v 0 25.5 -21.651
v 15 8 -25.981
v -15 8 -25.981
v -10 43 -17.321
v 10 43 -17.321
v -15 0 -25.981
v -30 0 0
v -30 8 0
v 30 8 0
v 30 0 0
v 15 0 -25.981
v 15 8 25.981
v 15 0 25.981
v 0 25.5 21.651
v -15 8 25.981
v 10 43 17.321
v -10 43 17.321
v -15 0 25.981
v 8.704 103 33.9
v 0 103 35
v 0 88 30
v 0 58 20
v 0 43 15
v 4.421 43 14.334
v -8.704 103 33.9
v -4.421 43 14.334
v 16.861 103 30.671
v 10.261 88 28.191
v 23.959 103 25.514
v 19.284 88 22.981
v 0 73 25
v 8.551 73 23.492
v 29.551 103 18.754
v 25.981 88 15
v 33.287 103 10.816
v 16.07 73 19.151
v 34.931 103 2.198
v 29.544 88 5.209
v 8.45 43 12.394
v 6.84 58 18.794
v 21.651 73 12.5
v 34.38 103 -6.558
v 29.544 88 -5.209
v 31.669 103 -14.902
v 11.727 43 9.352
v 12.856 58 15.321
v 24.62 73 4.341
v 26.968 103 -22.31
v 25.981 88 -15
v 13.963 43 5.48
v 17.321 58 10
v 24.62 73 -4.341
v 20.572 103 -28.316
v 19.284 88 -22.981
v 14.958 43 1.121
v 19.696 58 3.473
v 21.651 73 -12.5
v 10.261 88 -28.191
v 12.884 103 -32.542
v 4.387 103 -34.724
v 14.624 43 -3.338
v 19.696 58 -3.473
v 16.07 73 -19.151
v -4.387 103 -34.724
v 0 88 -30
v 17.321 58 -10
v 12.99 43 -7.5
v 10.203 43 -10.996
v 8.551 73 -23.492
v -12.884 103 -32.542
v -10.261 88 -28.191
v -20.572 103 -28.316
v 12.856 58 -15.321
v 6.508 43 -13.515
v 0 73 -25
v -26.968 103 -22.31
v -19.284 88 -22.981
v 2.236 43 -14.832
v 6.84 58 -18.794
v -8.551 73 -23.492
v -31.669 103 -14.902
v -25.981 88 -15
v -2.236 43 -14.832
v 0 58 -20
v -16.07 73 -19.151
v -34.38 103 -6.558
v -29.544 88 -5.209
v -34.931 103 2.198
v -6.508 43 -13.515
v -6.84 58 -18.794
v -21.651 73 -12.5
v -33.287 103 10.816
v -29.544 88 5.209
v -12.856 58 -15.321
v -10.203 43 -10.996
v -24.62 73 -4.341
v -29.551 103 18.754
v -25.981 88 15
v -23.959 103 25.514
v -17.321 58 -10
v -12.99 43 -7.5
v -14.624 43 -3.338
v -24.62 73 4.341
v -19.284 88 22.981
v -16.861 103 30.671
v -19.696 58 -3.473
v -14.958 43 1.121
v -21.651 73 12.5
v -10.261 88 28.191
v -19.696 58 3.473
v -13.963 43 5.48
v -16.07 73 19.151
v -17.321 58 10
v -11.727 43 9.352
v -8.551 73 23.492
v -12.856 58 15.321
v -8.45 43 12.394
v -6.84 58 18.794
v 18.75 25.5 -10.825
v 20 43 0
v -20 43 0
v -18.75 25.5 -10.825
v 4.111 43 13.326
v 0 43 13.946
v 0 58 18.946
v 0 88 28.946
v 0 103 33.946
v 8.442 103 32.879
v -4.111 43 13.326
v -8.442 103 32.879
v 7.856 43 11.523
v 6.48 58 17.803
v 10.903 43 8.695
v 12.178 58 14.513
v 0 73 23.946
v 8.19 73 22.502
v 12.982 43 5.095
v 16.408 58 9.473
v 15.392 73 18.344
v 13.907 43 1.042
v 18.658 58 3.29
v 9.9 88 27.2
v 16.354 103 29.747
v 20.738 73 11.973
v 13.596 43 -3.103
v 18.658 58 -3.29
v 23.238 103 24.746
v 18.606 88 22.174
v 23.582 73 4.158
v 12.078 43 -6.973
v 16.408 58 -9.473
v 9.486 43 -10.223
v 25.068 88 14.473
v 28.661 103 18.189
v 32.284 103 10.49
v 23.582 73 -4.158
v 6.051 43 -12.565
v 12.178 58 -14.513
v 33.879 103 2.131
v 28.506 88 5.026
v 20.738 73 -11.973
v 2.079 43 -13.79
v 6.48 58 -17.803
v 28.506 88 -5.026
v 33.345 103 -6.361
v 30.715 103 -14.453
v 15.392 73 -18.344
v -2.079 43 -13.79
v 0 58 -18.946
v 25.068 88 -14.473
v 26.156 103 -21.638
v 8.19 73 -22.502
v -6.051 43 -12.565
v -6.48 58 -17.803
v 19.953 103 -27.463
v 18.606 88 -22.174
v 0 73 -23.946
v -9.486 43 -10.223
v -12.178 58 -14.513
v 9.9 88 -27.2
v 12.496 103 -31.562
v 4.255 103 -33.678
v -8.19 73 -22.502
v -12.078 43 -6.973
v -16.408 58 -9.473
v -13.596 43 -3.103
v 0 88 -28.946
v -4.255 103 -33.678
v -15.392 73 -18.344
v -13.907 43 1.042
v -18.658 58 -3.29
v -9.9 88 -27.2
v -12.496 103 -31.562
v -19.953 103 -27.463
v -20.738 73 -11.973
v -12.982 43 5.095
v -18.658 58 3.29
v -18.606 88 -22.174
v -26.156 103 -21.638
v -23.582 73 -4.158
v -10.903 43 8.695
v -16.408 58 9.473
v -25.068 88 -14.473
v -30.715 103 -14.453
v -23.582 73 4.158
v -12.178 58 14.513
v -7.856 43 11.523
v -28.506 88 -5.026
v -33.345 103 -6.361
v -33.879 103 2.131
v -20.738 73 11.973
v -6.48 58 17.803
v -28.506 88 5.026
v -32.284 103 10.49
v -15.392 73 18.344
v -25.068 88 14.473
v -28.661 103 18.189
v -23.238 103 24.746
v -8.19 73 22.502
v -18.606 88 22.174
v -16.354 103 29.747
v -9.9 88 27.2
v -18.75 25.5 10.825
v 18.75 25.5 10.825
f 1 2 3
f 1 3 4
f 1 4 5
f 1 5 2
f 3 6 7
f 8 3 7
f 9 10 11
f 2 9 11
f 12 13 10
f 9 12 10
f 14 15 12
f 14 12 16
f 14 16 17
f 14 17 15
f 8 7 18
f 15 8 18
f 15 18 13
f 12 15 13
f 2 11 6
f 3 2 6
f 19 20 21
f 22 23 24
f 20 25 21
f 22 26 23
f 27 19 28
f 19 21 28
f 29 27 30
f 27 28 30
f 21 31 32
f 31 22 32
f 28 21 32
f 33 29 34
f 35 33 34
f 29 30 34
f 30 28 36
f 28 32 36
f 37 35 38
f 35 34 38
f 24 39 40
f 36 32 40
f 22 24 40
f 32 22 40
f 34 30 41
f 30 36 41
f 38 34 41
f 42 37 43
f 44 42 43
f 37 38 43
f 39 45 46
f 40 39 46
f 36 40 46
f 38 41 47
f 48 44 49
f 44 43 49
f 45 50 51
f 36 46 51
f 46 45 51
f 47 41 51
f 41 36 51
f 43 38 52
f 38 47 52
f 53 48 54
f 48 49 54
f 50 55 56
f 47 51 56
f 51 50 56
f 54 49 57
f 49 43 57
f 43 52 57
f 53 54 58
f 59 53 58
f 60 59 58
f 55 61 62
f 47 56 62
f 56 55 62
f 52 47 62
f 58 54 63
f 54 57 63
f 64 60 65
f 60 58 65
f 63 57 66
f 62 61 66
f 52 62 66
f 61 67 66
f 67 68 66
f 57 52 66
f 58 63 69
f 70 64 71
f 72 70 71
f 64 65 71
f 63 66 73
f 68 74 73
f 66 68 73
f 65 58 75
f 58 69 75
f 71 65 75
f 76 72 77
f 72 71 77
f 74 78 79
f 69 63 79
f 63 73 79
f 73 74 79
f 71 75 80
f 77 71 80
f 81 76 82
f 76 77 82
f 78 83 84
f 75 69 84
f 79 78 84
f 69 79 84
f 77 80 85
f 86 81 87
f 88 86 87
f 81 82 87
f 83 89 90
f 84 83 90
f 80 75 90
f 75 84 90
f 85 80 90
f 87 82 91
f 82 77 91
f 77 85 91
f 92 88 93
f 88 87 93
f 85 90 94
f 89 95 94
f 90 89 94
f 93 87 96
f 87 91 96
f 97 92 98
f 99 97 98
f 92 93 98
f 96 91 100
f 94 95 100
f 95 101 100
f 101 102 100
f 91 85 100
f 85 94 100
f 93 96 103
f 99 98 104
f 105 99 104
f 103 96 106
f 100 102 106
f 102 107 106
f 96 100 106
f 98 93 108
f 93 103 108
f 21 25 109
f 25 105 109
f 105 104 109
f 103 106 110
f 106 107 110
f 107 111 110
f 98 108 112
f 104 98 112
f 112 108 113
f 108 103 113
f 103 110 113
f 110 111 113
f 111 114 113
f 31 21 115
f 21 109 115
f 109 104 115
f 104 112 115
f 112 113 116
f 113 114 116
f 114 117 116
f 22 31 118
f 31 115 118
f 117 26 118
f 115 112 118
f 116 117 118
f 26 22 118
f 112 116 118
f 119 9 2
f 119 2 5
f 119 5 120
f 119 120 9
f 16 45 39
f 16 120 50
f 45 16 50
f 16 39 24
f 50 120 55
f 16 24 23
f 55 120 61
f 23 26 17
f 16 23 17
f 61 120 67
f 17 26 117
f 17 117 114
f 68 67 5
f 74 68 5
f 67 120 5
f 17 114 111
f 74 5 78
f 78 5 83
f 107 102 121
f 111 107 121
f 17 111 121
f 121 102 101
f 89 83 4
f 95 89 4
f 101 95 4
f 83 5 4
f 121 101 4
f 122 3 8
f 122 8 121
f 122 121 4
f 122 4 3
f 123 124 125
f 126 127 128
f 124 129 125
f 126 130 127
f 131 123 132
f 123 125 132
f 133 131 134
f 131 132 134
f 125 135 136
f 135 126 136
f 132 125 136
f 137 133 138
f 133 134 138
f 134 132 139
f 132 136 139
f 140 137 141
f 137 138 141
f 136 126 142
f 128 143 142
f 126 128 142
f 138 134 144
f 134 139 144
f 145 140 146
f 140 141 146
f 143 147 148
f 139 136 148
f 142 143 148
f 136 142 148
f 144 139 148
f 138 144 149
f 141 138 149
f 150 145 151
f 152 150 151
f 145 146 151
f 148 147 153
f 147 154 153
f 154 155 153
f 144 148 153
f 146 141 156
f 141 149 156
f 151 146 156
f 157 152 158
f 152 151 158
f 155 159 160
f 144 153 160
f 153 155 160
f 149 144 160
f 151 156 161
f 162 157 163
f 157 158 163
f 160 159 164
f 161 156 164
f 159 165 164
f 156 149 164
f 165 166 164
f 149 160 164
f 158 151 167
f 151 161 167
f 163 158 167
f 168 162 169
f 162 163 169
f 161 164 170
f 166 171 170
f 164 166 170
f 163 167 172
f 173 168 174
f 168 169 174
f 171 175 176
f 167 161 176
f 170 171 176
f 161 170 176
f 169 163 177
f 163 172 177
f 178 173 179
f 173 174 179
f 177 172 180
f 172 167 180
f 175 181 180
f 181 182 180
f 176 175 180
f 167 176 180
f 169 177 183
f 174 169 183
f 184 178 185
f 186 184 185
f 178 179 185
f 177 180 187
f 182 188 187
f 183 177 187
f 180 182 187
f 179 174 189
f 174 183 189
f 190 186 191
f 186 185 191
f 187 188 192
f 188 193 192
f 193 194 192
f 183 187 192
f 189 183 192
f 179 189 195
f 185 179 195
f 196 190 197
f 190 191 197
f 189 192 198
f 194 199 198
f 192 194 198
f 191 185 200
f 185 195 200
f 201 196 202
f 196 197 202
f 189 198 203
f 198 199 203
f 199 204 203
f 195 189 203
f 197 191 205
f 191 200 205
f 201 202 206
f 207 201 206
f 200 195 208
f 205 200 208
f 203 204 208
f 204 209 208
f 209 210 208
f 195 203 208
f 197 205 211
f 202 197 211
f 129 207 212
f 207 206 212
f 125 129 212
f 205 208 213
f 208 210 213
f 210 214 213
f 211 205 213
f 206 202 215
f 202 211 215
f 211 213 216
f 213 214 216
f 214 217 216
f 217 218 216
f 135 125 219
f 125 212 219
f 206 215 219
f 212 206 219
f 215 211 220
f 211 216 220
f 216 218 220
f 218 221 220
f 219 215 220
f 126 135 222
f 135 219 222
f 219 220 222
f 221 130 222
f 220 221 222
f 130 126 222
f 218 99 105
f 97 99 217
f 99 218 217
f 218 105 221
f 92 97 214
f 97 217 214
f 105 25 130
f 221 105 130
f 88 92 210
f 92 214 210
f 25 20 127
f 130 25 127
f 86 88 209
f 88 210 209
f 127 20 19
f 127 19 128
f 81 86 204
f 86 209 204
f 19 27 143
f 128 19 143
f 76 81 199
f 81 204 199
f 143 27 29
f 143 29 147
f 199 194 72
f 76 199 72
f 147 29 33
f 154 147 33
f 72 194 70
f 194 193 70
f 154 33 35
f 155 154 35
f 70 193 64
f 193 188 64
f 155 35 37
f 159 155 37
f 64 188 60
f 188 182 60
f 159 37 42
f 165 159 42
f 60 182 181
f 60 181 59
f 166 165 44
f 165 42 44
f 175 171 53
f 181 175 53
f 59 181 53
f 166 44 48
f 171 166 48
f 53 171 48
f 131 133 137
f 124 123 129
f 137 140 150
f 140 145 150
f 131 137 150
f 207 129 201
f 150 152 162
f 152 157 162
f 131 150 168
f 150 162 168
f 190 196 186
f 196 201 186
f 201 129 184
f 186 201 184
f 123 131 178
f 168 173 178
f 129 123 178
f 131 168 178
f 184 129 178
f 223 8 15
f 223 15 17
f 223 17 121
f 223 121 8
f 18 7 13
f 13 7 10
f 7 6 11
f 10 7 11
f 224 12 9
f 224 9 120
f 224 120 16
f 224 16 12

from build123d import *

# Parameters (mm, degrees)
EXTRUDE1_DEPTH = 8


with BuildPart() as part:
    # Sketch1 → Extrude1 (new body)
    with BuildSketch(Plane(origin=(0, 0, 0), x_dir=(1, 0, 0), z_dir=(0, 1, 0))):
        Polygon((30, 0), (15, 25.980762114), (-15, 25.980762114), (-30, 0), (-15, -25.980762114), (15, -25.980762114), align=None)
    extrude(amount=EXTRUDE1_DEPTH)

    # Sketch2 → Loft1 section 0
    with BuildSketch(Plane(origin=(0, 8, 0), x_dir=(1, 0, 0), z_dir=(0, 1, 0))):
        Polygon((30, 0), (15, 25.980762114), (-15, 25.980762114), (-30, 0), (-15, -25.980762114), (15, -25.980762114), align=None)
    # Sketch3 → Loft1 section 1
    with BuildSketch(Plane(origin=(0, 43, 0), x_dir=(-1, 0, 0), z_dir=(0, 1, 0))):
        Polygon((20, 0), (10, 17.320508076), (-10, 17.320508076), (-20, 0), (-10, -17.320508076), (10, -17.320508076), align=None)
    loft()

    # Sketch4 → Revolve1 (revolve)
    with BuildSketch(Plane.XY, mode=Mode.PRIVATE) as revolve1_sk:
        Polygon((35, 103), (15, 43), (13.945907447, 43), (33.945907447, 103), align=None)
    revolve(revolve1_sk.sketch.rotate(Axis((0, 43, 0), (0, 1, 0)), 270), axis=Axis((0, 43, 0), (0, 1, 0)))  # turned: the seam where the file's is


solid = part.part
